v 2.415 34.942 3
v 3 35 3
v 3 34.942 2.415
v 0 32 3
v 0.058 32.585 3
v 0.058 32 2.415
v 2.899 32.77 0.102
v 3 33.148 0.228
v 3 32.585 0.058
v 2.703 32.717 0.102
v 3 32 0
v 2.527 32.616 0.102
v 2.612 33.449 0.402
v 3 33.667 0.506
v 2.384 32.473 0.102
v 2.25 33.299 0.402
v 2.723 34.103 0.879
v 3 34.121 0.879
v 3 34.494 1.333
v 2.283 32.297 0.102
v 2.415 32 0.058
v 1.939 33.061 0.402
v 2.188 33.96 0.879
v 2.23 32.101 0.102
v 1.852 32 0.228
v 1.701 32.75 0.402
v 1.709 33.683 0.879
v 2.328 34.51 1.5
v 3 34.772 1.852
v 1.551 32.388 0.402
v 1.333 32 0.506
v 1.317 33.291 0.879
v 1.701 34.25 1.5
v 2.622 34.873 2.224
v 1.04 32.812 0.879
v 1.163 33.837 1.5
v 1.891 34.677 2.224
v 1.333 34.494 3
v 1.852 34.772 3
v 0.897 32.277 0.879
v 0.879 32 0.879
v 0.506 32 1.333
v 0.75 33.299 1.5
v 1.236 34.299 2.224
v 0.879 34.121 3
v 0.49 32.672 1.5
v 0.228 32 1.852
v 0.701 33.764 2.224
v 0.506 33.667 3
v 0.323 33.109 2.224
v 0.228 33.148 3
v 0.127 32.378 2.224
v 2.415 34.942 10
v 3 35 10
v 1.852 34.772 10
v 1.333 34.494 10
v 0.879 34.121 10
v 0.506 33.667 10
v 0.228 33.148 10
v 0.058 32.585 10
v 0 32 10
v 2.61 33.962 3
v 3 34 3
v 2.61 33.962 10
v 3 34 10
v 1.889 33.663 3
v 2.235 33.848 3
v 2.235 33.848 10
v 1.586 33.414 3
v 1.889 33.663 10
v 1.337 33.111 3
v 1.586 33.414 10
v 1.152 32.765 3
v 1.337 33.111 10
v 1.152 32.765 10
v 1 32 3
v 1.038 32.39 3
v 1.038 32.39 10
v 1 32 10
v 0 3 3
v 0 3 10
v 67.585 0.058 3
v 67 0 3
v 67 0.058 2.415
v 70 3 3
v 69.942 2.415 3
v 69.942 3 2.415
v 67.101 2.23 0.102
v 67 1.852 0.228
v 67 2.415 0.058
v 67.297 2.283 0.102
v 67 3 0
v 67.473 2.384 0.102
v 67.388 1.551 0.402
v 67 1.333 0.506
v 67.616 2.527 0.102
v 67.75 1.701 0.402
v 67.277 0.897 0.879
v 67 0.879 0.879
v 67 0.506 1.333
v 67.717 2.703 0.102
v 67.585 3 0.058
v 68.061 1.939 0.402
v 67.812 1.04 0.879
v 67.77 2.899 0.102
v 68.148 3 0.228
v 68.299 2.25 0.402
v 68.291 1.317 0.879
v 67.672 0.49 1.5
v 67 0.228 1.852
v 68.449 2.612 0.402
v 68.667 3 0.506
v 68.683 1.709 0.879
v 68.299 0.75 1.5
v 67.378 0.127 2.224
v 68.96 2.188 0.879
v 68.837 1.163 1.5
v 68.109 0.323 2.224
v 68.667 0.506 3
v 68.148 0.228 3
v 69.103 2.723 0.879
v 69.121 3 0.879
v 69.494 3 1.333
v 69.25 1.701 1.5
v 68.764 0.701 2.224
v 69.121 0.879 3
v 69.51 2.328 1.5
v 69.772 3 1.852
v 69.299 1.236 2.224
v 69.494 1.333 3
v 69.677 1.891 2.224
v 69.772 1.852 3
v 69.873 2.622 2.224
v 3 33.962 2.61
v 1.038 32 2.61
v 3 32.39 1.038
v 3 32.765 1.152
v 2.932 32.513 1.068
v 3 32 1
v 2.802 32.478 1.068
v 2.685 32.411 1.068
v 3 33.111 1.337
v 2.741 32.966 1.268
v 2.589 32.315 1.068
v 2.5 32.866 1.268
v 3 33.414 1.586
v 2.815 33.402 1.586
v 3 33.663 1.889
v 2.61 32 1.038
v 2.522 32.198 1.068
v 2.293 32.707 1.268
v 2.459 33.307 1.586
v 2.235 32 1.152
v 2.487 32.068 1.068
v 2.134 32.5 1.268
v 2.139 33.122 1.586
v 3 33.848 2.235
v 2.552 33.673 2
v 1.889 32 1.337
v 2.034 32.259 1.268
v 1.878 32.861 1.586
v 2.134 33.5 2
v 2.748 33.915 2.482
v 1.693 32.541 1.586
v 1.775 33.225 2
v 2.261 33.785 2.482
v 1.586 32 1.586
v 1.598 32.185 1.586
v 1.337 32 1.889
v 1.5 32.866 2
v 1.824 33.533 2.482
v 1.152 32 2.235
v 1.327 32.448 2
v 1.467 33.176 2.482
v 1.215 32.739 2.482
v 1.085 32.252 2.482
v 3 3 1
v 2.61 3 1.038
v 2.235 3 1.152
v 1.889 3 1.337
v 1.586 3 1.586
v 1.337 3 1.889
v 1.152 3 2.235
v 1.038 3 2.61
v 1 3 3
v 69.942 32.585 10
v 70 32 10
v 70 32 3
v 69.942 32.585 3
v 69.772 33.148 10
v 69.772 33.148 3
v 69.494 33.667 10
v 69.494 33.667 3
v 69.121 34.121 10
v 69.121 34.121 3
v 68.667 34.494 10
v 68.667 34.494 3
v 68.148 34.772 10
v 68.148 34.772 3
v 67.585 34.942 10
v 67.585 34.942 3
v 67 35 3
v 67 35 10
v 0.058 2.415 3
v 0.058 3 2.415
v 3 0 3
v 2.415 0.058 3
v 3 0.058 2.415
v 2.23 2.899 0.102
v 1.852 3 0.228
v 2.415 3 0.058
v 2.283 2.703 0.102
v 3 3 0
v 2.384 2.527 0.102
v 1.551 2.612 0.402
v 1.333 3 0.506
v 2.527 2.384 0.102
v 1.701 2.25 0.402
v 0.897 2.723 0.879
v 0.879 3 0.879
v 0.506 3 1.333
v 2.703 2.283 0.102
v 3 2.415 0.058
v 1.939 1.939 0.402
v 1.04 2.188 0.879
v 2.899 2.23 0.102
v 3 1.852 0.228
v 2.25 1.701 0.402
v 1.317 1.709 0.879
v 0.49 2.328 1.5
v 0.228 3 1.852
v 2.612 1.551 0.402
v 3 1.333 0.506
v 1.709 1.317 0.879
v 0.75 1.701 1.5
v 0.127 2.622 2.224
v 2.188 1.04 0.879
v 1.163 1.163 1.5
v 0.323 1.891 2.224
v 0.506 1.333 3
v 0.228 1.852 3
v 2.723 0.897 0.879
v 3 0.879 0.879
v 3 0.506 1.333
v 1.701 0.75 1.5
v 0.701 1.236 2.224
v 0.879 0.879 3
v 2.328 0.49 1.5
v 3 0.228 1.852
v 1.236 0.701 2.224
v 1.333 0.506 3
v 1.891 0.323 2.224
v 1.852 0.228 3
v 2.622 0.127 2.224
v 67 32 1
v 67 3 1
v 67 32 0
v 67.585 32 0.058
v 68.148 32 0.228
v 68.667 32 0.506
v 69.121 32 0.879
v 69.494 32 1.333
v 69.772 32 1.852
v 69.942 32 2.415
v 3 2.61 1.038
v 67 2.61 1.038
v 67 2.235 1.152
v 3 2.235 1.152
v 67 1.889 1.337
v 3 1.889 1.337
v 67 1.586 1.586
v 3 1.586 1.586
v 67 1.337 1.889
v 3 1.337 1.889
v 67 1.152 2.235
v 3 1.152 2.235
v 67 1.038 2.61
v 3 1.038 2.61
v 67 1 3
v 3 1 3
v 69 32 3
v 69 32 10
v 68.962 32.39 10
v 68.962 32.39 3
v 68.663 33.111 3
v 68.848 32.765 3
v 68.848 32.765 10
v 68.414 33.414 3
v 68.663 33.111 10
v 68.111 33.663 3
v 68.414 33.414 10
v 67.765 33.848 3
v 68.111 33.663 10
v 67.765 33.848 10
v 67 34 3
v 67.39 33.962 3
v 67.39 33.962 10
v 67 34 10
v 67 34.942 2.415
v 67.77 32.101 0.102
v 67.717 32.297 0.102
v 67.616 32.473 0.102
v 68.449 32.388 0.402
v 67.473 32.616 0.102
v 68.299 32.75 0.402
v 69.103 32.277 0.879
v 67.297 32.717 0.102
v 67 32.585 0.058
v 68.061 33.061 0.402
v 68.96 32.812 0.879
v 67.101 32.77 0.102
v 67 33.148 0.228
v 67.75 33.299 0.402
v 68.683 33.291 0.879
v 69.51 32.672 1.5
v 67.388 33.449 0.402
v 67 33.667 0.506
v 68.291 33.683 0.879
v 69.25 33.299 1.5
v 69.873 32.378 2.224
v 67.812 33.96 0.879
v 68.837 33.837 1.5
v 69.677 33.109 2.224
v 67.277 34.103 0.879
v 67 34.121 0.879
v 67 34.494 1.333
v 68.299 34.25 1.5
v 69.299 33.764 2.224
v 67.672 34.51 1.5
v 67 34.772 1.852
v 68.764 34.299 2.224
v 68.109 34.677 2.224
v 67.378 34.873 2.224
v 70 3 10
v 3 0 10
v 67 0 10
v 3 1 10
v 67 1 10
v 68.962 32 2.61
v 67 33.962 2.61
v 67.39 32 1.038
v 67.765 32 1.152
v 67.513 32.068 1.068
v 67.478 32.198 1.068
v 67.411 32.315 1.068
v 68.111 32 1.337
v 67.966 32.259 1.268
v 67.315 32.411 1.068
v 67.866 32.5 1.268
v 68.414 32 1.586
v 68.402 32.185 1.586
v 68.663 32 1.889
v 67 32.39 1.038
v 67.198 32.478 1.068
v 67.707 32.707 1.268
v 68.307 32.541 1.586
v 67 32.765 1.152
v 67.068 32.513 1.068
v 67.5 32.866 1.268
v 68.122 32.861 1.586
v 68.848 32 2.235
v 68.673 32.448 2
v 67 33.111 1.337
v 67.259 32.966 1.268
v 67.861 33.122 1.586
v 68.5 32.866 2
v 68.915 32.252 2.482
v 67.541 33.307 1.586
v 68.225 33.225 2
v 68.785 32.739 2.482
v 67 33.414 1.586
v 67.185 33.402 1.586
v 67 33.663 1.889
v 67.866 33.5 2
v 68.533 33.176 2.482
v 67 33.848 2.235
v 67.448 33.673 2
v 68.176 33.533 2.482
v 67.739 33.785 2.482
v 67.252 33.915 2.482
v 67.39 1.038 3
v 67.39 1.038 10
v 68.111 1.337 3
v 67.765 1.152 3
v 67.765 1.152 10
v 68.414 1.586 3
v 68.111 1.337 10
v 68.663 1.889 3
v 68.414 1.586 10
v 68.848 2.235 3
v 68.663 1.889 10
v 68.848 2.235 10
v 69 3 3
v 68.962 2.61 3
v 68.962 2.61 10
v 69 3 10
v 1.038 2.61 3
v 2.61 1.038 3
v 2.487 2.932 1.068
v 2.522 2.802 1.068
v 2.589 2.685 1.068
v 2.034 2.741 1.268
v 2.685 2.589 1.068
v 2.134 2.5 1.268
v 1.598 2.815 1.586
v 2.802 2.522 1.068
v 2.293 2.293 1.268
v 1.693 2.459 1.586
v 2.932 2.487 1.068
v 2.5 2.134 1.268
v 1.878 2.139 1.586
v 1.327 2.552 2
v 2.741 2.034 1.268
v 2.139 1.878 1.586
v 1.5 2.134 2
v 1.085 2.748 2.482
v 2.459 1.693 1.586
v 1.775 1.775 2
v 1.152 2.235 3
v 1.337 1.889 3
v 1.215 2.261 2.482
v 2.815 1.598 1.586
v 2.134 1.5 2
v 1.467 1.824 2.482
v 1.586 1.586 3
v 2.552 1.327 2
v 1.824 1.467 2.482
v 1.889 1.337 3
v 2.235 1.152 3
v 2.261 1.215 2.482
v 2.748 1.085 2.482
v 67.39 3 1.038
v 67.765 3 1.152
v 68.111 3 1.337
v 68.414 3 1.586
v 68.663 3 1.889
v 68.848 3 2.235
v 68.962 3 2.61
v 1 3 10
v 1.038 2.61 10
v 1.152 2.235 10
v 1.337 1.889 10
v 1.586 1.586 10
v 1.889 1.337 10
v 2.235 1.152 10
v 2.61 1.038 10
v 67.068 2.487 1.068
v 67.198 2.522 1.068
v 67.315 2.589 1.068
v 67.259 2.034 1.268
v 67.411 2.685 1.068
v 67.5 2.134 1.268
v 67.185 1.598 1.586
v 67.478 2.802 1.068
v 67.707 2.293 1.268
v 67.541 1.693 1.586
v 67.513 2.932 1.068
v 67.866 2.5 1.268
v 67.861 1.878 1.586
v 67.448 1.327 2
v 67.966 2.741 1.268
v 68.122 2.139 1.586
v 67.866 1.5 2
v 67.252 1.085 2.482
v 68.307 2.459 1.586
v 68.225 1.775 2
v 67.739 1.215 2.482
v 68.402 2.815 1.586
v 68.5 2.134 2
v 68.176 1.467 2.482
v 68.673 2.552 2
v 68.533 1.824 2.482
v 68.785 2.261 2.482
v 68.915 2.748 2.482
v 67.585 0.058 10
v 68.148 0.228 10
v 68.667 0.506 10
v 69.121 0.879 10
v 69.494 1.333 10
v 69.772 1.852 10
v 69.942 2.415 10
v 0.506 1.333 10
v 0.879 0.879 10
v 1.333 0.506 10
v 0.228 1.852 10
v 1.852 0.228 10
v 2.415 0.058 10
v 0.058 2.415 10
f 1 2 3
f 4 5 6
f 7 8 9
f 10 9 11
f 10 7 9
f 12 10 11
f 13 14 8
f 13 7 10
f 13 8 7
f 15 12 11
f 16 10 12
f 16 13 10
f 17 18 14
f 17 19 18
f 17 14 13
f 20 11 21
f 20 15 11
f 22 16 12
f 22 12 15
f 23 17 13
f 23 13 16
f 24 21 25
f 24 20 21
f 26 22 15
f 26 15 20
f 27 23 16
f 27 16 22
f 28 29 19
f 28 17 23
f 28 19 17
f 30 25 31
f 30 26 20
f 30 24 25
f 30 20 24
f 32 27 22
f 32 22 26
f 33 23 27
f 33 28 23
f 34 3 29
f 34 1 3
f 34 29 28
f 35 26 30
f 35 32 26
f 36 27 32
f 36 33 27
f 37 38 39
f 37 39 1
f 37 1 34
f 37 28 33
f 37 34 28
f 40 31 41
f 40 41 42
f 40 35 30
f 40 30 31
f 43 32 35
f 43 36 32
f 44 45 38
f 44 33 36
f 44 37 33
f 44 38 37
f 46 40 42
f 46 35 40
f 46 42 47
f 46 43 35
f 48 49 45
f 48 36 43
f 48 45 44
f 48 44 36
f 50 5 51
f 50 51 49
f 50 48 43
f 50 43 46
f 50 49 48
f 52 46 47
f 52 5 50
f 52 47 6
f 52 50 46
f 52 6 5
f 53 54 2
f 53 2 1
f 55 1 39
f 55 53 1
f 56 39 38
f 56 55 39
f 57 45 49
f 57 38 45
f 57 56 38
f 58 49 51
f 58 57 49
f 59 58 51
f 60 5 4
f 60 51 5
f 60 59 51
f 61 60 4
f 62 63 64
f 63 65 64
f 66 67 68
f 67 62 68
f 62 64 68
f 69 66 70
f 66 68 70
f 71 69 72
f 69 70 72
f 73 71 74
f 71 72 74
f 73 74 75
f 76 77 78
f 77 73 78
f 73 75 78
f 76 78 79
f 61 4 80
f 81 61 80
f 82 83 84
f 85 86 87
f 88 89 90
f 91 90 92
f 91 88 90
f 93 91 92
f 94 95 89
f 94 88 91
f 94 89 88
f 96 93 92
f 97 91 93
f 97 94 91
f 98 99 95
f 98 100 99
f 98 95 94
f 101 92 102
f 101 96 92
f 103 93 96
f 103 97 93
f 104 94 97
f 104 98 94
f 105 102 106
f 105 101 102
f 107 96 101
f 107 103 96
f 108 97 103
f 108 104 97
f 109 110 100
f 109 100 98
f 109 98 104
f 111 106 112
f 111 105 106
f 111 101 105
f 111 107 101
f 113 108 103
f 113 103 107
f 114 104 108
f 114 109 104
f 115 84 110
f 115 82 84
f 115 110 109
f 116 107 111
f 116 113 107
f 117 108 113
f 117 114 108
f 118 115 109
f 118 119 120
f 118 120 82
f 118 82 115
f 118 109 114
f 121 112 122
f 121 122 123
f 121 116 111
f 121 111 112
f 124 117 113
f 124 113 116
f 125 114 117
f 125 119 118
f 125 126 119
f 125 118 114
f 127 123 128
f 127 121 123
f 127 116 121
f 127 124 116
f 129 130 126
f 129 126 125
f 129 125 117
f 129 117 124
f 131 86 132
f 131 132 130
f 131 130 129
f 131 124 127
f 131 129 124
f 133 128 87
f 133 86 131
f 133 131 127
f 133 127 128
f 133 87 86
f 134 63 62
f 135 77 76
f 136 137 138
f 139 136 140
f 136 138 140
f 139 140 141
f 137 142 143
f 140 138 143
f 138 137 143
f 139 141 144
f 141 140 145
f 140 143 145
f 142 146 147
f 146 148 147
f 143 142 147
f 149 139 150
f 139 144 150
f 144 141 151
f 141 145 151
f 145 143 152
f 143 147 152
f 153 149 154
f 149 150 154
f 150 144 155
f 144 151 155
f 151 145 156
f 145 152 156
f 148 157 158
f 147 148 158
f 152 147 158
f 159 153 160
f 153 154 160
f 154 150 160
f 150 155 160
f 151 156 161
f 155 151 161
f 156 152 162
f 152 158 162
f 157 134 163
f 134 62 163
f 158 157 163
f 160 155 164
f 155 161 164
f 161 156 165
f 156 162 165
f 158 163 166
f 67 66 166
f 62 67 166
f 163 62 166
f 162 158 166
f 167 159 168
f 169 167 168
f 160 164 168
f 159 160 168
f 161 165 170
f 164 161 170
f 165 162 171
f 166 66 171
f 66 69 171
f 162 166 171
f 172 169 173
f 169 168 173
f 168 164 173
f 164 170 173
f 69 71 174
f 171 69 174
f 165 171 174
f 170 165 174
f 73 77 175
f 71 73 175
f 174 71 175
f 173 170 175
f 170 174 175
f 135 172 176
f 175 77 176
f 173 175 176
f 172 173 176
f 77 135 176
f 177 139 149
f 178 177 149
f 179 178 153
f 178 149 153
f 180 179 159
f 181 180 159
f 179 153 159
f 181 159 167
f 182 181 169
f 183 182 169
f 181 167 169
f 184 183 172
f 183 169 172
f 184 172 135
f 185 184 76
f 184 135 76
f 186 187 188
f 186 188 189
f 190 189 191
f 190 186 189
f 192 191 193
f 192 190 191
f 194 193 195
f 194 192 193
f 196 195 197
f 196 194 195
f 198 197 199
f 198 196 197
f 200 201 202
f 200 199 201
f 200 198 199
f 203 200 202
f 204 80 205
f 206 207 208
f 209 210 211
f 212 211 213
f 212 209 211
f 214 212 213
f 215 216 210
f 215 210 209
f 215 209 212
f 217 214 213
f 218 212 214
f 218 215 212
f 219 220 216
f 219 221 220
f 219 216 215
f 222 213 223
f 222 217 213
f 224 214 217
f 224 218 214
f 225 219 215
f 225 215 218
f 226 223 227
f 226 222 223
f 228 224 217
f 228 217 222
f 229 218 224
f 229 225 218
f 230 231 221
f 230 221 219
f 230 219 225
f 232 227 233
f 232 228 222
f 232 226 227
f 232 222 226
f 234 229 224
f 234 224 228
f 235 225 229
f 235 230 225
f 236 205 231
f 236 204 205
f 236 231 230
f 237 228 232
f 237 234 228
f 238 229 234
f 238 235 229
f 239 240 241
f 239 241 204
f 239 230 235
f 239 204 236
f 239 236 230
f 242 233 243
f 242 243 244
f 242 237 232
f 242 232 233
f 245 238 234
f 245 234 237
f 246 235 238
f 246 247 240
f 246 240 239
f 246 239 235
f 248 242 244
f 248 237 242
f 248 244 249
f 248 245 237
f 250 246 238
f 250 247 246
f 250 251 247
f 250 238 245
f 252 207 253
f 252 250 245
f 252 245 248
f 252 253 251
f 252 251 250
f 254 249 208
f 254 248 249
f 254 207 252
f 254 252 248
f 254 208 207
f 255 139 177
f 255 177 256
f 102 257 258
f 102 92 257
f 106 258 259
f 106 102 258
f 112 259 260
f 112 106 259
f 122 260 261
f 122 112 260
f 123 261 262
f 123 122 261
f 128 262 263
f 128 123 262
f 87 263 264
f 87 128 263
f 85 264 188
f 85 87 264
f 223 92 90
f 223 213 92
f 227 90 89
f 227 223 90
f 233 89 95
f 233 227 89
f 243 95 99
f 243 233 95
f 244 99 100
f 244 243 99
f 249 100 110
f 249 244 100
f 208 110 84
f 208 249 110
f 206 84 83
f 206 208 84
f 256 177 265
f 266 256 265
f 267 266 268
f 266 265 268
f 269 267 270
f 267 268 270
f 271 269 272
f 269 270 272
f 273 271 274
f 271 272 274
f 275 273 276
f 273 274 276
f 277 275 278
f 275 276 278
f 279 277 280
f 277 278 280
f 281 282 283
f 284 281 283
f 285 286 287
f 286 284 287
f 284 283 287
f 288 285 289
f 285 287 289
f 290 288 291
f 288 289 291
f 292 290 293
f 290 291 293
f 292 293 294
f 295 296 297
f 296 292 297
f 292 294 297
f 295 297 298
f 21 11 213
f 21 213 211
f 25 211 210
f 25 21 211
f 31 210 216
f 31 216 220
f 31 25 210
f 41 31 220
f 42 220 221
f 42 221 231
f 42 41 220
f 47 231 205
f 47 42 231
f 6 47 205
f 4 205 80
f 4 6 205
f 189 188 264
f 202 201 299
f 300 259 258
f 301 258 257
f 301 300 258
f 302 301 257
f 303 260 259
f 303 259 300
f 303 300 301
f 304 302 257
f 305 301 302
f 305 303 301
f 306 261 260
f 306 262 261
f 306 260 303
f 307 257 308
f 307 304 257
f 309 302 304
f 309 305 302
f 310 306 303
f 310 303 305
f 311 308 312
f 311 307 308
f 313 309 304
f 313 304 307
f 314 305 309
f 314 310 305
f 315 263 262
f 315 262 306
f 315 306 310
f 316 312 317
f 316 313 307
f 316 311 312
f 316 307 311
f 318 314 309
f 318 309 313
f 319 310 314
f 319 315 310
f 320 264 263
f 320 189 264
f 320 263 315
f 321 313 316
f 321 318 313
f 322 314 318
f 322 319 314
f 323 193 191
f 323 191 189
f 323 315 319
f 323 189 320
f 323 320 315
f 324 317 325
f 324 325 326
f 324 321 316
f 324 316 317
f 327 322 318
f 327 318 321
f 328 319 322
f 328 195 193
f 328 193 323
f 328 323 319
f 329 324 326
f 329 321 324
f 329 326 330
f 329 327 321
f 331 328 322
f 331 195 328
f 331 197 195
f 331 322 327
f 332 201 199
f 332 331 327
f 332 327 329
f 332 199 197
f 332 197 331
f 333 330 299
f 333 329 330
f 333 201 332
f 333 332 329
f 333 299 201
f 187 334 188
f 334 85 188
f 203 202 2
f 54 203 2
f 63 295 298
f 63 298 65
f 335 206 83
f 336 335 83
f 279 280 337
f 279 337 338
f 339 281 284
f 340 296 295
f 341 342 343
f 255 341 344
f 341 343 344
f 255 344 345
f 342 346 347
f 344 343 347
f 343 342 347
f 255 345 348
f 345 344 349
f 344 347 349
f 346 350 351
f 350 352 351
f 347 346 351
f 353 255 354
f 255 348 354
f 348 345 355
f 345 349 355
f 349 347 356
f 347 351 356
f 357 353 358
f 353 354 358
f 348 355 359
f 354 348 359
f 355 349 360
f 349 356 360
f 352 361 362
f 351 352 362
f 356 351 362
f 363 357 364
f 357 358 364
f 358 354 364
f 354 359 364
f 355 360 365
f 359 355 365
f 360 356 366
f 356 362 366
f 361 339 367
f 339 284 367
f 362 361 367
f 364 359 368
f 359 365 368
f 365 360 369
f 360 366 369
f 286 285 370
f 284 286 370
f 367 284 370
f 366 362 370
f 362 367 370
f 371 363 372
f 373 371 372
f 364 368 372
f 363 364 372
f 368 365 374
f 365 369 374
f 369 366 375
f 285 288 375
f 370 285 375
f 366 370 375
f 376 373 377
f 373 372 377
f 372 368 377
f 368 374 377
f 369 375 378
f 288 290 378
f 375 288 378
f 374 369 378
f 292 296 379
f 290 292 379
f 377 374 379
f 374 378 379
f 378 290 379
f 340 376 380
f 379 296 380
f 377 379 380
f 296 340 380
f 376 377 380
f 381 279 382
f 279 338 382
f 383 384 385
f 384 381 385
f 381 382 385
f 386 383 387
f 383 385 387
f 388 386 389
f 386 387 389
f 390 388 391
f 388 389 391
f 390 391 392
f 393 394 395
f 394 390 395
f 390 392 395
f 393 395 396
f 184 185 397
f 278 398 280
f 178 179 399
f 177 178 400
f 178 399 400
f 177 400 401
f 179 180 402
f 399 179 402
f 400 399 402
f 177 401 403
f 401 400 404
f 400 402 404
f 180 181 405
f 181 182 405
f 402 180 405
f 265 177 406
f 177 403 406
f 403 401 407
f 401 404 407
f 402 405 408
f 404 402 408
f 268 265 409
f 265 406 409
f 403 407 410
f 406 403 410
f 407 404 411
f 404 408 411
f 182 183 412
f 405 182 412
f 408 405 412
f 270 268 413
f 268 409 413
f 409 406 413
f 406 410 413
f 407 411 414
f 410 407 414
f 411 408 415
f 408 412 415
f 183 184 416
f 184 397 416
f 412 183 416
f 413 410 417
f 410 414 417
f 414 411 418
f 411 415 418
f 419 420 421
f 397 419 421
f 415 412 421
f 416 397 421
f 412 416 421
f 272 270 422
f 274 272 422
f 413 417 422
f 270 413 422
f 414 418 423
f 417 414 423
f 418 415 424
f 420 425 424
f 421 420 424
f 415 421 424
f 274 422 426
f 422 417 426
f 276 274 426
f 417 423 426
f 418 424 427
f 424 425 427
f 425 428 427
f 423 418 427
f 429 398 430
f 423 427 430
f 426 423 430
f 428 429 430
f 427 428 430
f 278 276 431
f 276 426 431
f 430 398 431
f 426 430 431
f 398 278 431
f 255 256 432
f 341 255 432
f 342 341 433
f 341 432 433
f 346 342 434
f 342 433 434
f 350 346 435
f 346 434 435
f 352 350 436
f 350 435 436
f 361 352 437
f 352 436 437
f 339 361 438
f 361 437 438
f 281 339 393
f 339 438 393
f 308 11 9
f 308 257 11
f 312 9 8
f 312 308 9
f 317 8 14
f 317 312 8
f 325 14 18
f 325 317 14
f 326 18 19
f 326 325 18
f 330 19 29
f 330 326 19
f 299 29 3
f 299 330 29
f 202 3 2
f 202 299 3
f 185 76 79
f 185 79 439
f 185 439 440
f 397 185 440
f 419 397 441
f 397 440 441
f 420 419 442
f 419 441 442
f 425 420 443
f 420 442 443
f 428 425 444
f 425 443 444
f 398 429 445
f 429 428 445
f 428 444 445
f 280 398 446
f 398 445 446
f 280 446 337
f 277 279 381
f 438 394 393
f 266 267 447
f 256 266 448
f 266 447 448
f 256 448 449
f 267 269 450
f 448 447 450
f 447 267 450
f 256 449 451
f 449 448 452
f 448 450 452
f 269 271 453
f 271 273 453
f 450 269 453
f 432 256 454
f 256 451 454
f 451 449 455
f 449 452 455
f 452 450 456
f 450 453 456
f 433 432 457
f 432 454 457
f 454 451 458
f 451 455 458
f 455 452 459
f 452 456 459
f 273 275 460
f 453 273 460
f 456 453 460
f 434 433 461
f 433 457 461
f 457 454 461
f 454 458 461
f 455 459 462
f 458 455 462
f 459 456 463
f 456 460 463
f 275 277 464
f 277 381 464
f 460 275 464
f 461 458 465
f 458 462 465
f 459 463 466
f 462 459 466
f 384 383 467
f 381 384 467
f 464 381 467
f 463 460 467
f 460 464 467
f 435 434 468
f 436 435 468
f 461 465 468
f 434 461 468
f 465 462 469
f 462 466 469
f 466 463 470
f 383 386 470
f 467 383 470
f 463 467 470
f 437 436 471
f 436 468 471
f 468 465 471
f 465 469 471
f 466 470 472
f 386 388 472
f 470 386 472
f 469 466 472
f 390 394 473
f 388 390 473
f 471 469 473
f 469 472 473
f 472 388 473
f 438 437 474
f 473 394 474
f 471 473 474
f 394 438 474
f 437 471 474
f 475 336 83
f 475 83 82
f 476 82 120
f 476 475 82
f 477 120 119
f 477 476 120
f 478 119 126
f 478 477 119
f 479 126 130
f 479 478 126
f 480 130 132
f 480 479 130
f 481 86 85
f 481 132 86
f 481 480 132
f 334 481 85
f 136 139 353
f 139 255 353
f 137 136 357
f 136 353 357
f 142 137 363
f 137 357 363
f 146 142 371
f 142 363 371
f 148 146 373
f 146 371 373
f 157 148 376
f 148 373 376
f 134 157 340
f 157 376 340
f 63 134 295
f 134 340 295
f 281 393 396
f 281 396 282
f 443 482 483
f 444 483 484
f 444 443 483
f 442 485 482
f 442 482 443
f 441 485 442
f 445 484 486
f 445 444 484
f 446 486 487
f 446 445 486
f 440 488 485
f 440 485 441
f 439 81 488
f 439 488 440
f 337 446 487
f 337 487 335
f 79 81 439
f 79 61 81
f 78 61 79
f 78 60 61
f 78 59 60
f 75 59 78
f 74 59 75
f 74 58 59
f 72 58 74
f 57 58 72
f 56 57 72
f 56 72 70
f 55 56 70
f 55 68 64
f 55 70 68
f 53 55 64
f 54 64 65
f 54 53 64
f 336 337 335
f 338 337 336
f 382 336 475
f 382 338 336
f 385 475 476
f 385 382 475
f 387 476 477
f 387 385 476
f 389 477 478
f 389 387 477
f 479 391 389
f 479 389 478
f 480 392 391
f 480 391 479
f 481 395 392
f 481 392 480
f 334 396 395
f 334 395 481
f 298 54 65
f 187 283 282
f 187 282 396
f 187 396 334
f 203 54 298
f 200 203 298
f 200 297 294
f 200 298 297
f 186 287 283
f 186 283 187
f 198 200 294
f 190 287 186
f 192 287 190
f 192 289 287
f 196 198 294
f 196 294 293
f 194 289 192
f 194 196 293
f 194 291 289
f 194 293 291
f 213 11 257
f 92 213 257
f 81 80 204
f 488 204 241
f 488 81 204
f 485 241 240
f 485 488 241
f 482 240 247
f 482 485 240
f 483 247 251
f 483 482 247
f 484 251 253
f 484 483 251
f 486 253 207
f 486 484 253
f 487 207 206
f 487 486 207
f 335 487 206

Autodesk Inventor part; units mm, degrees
ref_plane "YZ Plane" through (0, 0, 0) normal (1, 0, 0) x (0, 1, 0)
ref_plane "XZ Plane" through (0, 0, 0) normal (0, 1, 0) x (-1, 0, 0)
ref_plane "XY Plane" through (0, 0, 0) normal (0, 0, 1) x (1, 0, 0)
sketch "Esboço1" plane through (0, 0, 0) normal (0, 0, 1) x (1, 0, 0)
  line L0 (0, 0) -> (70, 0)
  line L1 (70, 0) -> (70, 35)
  line L2 (70, 35) -> (0, 35)
  line L3 (0, 35) -> (0, 0)
  dimension "d0" = 70
  dimension "d1" = 35
extrude "Extrusão1" add sketch "Esboço1" along normal blind 10
fillet "Arredondamento1" radius 3 4 edges at (70, 35, 5) (70, 0, 5) (0, 35, 5) (0, 0, 5)
fillet "Arredondamento2" radius 3 8 edges at (0.8787, 34.1213, 0) (0, 17.5, 0) (0.8787, 0.8787, 0) (35, 0, 0) (69.1213, 0.8787, 0) (70, 17.5, 0) (69.1213, 34.1213, 0) (35, 35, 0)
shell "Casca1" thickness 1 removed faces 1 at (45.6667, 11.6667, 10)
properties part number "Peça3-Rubia"
